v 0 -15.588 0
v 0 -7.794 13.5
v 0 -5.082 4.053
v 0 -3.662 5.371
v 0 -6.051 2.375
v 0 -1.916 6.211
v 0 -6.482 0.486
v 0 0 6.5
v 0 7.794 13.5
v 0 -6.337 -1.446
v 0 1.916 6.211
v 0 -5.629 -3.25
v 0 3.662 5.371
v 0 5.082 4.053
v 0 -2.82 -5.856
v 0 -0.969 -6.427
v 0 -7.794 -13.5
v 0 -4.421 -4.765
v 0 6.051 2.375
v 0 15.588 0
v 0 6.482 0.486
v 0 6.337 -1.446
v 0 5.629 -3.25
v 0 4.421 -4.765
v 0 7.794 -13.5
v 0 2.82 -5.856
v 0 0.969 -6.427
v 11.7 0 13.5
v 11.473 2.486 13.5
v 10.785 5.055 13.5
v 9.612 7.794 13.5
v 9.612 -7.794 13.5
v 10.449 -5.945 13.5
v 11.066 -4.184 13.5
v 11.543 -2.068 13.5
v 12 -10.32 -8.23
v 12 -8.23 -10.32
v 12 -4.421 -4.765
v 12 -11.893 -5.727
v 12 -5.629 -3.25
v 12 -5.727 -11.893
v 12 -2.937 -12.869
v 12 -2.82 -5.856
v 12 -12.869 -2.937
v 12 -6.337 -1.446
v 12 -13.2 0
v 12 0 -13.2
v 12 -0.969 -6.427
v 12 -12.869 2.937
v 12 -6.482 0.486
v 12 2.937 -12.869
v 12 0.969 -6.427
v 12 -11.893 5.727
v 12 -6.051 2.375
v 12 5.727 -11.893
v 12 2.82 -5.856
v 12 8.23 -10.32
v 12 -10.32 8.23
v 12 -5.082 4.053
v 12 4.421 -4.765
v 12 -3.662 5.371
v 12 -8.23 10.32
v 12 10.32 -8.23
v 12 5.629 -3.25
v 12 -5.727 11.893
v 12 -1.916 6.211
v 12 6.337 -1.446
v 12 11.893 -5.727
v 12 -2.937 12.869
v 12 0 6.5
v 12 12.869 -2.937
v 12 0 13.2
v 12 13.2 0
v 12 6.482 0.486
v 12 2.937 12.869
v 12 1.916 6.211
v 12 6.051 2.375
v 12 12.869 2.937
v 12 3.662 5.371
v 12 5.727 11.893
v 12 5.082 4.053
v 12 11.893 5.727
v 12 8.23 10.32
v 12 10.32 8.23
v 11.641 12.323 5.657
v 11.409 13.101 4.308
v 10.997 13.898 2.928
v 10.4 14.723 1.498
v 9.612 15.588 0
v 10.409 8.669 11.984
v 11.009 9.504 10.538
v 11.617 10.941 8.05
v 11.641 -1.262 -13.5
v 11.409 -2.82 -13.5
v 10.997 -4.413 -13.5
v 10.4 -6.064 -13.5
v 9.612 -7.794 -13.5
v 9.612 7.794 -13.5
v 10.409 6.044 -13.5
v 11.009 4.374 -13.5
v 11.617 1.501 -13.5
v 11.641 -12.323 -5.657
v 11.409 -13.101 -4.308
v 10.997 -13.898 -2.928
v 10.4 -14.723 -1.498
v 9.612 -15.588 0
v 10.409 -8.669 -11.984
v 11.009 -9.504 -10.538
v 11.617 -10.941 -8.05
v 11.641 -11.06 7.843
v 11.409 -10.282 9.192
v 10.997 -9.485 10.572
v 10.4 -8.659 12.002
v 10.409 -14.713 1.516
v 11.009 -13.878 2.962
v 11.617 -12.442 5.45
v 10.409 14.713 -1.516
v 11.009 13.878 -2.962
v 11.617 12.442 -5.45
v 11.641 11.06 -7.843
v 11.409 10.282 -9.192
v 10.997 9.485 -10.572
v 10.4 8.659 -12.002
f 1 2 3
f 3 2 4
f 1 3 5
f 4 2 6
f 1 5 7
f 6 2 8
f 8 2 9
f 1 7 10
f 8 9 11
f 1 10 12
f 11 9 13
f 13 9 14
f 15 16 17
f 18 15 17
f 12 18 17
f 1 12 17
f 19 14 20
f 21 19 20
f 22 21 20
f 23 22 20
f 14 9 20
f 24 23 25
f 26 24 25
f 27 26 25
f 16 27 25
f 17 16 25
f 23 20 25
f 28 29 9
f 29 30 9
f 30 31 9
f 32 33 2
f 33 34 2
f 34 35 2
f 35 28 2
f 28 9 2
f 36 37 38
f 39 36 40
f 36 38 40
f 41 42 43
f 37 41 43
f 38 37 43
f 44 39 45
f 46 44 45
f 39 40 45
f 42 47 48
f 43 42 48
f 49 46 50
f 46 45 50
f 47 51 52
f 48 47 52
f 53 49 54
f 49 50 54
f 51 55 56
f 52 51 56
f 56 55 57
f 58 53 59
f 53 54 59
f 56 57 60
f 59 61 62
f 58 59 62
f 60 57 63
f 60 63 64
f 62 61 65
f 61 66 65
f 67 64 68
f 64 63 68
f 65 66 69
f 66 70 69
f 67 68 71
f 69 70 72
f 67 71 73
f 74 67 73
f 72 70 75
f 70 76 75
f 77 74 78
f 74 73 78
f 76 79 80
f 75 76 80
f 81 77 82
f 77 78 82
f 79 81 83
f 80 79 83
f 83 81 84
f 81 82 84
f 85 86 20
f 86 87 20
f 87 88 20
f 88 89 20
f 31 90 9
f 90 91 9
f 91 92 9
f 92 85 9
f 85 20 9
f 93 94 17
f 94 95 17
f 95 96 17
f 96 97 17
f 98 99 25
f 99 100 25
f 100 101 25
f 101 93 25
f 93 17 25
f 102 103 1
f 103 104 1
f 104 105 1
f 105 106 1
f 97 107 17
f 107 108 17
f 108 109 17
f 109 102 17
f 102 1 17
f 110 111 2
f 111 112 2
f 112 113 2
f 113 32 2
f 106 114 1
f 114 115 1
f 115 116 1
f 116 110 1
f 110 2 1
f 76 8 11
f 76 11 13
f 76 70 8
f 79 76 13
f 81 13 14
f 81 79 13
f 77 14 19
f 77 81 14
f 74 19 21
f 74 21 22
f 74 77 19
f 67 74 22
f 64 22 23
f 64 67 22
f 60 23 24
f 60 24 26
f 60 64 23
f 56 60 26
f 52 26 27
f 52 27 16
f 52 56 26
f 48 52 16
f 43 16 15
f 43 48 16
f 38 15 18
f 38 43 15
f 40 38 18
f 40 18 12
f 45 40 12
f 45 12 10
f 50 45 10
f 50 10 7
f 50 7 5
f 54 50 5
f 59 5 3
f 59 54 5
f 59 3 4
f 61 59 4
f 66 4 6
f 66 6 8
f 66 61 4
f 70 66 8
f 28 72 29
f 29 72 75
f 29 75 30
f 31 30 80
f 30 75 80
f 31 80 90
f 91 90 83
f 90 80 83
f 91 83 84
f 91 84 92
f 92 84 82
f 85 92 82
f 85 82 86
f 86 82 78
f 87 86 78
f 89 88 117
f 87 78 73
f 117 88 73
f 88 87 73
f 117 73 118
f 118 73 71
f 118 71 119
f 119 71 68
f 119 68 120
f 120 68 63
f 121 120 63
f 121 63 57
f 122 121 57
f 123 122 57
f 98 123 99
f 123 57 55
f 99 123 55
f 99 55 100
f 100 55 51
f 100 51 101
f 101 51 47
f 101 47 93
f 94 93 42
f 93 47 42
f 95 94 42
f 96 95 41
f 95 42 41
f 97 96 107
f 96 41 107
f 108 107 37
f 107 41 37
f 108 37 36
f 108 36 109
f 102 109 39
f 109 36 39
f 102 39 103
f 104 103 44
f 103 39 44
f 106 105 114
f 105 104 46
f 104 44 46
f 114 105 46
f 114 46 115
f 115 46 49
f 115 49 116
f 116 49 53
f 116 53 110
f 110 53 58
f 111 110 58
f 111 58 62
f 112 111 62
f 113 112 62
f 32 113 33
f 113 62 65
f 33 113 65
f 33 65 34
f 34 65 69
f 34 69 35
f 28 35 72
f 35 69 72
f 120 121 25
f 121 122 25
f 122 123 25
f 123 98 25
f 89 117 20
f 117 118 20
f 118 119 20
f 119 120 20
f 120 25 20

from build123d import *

# Parameters (mm, degrees)
SKETCH2_R          = 27
CUT_EXTRUDE1_DEPTH = 12
SKETCH3_W          = 12
SKETCH3_H          = 6.5


with BuildPart() as part:
    # Sketch1 → Revolve1 (revolve)
    with BuildSketch(Plane.XY, mode=Mode.PRIVATE) as revolve1_sk:
        Polygon((0, 0), (0, 16.2), (9, 16.2), (12, 13.2), (12, 0), align=None)
    revolve(revolve1_sk.sketch.rotate(Axis((12, 0, 0), (-1, 0, 0)), 270), axis=Axis((12, 0, 0), (-1, 0, 0)))

    # Sketch2 → Cut-Extrude1 (cut)
    with BuildSketch(Plane(origin=(0, 0, 0), x_dir=(0, 0, -1), z_dir=(1, 0, 0))):
        Circle(SKETCH2_R)
        Polygon((-13.5, -7.794228634), (0, -15.588457268), (13.5, -7.794228634), (13.5, 7.794228634), (0, 15.588457268), (-13.5, 7.794228634), align=None, mode=Mode.SUBTRACT)
    extrude(amount=CUT_EXTRUDE1_DEPTH, mode=Mode.SUBTRACT)

    # Sketch3 → Cut-Revolve1 (revolve, cut)
    with BuildSketch(Plane.XY, mode=Mode.PRIVATE) as cut_revolve1_sk:
        with Locations((6, 3.25)):
            Rectangle(SKETCH3_W, SKETCH3_H)
    revolve(cut_revolve1_sk.sketch.rotate(Axis((12, 0, 0), (-1, 0, 0)), 270), axis=Axis((12, 0, 0), (-1, 0, 0)), mode=Mode.SUBTRACT)


solid = part.part
